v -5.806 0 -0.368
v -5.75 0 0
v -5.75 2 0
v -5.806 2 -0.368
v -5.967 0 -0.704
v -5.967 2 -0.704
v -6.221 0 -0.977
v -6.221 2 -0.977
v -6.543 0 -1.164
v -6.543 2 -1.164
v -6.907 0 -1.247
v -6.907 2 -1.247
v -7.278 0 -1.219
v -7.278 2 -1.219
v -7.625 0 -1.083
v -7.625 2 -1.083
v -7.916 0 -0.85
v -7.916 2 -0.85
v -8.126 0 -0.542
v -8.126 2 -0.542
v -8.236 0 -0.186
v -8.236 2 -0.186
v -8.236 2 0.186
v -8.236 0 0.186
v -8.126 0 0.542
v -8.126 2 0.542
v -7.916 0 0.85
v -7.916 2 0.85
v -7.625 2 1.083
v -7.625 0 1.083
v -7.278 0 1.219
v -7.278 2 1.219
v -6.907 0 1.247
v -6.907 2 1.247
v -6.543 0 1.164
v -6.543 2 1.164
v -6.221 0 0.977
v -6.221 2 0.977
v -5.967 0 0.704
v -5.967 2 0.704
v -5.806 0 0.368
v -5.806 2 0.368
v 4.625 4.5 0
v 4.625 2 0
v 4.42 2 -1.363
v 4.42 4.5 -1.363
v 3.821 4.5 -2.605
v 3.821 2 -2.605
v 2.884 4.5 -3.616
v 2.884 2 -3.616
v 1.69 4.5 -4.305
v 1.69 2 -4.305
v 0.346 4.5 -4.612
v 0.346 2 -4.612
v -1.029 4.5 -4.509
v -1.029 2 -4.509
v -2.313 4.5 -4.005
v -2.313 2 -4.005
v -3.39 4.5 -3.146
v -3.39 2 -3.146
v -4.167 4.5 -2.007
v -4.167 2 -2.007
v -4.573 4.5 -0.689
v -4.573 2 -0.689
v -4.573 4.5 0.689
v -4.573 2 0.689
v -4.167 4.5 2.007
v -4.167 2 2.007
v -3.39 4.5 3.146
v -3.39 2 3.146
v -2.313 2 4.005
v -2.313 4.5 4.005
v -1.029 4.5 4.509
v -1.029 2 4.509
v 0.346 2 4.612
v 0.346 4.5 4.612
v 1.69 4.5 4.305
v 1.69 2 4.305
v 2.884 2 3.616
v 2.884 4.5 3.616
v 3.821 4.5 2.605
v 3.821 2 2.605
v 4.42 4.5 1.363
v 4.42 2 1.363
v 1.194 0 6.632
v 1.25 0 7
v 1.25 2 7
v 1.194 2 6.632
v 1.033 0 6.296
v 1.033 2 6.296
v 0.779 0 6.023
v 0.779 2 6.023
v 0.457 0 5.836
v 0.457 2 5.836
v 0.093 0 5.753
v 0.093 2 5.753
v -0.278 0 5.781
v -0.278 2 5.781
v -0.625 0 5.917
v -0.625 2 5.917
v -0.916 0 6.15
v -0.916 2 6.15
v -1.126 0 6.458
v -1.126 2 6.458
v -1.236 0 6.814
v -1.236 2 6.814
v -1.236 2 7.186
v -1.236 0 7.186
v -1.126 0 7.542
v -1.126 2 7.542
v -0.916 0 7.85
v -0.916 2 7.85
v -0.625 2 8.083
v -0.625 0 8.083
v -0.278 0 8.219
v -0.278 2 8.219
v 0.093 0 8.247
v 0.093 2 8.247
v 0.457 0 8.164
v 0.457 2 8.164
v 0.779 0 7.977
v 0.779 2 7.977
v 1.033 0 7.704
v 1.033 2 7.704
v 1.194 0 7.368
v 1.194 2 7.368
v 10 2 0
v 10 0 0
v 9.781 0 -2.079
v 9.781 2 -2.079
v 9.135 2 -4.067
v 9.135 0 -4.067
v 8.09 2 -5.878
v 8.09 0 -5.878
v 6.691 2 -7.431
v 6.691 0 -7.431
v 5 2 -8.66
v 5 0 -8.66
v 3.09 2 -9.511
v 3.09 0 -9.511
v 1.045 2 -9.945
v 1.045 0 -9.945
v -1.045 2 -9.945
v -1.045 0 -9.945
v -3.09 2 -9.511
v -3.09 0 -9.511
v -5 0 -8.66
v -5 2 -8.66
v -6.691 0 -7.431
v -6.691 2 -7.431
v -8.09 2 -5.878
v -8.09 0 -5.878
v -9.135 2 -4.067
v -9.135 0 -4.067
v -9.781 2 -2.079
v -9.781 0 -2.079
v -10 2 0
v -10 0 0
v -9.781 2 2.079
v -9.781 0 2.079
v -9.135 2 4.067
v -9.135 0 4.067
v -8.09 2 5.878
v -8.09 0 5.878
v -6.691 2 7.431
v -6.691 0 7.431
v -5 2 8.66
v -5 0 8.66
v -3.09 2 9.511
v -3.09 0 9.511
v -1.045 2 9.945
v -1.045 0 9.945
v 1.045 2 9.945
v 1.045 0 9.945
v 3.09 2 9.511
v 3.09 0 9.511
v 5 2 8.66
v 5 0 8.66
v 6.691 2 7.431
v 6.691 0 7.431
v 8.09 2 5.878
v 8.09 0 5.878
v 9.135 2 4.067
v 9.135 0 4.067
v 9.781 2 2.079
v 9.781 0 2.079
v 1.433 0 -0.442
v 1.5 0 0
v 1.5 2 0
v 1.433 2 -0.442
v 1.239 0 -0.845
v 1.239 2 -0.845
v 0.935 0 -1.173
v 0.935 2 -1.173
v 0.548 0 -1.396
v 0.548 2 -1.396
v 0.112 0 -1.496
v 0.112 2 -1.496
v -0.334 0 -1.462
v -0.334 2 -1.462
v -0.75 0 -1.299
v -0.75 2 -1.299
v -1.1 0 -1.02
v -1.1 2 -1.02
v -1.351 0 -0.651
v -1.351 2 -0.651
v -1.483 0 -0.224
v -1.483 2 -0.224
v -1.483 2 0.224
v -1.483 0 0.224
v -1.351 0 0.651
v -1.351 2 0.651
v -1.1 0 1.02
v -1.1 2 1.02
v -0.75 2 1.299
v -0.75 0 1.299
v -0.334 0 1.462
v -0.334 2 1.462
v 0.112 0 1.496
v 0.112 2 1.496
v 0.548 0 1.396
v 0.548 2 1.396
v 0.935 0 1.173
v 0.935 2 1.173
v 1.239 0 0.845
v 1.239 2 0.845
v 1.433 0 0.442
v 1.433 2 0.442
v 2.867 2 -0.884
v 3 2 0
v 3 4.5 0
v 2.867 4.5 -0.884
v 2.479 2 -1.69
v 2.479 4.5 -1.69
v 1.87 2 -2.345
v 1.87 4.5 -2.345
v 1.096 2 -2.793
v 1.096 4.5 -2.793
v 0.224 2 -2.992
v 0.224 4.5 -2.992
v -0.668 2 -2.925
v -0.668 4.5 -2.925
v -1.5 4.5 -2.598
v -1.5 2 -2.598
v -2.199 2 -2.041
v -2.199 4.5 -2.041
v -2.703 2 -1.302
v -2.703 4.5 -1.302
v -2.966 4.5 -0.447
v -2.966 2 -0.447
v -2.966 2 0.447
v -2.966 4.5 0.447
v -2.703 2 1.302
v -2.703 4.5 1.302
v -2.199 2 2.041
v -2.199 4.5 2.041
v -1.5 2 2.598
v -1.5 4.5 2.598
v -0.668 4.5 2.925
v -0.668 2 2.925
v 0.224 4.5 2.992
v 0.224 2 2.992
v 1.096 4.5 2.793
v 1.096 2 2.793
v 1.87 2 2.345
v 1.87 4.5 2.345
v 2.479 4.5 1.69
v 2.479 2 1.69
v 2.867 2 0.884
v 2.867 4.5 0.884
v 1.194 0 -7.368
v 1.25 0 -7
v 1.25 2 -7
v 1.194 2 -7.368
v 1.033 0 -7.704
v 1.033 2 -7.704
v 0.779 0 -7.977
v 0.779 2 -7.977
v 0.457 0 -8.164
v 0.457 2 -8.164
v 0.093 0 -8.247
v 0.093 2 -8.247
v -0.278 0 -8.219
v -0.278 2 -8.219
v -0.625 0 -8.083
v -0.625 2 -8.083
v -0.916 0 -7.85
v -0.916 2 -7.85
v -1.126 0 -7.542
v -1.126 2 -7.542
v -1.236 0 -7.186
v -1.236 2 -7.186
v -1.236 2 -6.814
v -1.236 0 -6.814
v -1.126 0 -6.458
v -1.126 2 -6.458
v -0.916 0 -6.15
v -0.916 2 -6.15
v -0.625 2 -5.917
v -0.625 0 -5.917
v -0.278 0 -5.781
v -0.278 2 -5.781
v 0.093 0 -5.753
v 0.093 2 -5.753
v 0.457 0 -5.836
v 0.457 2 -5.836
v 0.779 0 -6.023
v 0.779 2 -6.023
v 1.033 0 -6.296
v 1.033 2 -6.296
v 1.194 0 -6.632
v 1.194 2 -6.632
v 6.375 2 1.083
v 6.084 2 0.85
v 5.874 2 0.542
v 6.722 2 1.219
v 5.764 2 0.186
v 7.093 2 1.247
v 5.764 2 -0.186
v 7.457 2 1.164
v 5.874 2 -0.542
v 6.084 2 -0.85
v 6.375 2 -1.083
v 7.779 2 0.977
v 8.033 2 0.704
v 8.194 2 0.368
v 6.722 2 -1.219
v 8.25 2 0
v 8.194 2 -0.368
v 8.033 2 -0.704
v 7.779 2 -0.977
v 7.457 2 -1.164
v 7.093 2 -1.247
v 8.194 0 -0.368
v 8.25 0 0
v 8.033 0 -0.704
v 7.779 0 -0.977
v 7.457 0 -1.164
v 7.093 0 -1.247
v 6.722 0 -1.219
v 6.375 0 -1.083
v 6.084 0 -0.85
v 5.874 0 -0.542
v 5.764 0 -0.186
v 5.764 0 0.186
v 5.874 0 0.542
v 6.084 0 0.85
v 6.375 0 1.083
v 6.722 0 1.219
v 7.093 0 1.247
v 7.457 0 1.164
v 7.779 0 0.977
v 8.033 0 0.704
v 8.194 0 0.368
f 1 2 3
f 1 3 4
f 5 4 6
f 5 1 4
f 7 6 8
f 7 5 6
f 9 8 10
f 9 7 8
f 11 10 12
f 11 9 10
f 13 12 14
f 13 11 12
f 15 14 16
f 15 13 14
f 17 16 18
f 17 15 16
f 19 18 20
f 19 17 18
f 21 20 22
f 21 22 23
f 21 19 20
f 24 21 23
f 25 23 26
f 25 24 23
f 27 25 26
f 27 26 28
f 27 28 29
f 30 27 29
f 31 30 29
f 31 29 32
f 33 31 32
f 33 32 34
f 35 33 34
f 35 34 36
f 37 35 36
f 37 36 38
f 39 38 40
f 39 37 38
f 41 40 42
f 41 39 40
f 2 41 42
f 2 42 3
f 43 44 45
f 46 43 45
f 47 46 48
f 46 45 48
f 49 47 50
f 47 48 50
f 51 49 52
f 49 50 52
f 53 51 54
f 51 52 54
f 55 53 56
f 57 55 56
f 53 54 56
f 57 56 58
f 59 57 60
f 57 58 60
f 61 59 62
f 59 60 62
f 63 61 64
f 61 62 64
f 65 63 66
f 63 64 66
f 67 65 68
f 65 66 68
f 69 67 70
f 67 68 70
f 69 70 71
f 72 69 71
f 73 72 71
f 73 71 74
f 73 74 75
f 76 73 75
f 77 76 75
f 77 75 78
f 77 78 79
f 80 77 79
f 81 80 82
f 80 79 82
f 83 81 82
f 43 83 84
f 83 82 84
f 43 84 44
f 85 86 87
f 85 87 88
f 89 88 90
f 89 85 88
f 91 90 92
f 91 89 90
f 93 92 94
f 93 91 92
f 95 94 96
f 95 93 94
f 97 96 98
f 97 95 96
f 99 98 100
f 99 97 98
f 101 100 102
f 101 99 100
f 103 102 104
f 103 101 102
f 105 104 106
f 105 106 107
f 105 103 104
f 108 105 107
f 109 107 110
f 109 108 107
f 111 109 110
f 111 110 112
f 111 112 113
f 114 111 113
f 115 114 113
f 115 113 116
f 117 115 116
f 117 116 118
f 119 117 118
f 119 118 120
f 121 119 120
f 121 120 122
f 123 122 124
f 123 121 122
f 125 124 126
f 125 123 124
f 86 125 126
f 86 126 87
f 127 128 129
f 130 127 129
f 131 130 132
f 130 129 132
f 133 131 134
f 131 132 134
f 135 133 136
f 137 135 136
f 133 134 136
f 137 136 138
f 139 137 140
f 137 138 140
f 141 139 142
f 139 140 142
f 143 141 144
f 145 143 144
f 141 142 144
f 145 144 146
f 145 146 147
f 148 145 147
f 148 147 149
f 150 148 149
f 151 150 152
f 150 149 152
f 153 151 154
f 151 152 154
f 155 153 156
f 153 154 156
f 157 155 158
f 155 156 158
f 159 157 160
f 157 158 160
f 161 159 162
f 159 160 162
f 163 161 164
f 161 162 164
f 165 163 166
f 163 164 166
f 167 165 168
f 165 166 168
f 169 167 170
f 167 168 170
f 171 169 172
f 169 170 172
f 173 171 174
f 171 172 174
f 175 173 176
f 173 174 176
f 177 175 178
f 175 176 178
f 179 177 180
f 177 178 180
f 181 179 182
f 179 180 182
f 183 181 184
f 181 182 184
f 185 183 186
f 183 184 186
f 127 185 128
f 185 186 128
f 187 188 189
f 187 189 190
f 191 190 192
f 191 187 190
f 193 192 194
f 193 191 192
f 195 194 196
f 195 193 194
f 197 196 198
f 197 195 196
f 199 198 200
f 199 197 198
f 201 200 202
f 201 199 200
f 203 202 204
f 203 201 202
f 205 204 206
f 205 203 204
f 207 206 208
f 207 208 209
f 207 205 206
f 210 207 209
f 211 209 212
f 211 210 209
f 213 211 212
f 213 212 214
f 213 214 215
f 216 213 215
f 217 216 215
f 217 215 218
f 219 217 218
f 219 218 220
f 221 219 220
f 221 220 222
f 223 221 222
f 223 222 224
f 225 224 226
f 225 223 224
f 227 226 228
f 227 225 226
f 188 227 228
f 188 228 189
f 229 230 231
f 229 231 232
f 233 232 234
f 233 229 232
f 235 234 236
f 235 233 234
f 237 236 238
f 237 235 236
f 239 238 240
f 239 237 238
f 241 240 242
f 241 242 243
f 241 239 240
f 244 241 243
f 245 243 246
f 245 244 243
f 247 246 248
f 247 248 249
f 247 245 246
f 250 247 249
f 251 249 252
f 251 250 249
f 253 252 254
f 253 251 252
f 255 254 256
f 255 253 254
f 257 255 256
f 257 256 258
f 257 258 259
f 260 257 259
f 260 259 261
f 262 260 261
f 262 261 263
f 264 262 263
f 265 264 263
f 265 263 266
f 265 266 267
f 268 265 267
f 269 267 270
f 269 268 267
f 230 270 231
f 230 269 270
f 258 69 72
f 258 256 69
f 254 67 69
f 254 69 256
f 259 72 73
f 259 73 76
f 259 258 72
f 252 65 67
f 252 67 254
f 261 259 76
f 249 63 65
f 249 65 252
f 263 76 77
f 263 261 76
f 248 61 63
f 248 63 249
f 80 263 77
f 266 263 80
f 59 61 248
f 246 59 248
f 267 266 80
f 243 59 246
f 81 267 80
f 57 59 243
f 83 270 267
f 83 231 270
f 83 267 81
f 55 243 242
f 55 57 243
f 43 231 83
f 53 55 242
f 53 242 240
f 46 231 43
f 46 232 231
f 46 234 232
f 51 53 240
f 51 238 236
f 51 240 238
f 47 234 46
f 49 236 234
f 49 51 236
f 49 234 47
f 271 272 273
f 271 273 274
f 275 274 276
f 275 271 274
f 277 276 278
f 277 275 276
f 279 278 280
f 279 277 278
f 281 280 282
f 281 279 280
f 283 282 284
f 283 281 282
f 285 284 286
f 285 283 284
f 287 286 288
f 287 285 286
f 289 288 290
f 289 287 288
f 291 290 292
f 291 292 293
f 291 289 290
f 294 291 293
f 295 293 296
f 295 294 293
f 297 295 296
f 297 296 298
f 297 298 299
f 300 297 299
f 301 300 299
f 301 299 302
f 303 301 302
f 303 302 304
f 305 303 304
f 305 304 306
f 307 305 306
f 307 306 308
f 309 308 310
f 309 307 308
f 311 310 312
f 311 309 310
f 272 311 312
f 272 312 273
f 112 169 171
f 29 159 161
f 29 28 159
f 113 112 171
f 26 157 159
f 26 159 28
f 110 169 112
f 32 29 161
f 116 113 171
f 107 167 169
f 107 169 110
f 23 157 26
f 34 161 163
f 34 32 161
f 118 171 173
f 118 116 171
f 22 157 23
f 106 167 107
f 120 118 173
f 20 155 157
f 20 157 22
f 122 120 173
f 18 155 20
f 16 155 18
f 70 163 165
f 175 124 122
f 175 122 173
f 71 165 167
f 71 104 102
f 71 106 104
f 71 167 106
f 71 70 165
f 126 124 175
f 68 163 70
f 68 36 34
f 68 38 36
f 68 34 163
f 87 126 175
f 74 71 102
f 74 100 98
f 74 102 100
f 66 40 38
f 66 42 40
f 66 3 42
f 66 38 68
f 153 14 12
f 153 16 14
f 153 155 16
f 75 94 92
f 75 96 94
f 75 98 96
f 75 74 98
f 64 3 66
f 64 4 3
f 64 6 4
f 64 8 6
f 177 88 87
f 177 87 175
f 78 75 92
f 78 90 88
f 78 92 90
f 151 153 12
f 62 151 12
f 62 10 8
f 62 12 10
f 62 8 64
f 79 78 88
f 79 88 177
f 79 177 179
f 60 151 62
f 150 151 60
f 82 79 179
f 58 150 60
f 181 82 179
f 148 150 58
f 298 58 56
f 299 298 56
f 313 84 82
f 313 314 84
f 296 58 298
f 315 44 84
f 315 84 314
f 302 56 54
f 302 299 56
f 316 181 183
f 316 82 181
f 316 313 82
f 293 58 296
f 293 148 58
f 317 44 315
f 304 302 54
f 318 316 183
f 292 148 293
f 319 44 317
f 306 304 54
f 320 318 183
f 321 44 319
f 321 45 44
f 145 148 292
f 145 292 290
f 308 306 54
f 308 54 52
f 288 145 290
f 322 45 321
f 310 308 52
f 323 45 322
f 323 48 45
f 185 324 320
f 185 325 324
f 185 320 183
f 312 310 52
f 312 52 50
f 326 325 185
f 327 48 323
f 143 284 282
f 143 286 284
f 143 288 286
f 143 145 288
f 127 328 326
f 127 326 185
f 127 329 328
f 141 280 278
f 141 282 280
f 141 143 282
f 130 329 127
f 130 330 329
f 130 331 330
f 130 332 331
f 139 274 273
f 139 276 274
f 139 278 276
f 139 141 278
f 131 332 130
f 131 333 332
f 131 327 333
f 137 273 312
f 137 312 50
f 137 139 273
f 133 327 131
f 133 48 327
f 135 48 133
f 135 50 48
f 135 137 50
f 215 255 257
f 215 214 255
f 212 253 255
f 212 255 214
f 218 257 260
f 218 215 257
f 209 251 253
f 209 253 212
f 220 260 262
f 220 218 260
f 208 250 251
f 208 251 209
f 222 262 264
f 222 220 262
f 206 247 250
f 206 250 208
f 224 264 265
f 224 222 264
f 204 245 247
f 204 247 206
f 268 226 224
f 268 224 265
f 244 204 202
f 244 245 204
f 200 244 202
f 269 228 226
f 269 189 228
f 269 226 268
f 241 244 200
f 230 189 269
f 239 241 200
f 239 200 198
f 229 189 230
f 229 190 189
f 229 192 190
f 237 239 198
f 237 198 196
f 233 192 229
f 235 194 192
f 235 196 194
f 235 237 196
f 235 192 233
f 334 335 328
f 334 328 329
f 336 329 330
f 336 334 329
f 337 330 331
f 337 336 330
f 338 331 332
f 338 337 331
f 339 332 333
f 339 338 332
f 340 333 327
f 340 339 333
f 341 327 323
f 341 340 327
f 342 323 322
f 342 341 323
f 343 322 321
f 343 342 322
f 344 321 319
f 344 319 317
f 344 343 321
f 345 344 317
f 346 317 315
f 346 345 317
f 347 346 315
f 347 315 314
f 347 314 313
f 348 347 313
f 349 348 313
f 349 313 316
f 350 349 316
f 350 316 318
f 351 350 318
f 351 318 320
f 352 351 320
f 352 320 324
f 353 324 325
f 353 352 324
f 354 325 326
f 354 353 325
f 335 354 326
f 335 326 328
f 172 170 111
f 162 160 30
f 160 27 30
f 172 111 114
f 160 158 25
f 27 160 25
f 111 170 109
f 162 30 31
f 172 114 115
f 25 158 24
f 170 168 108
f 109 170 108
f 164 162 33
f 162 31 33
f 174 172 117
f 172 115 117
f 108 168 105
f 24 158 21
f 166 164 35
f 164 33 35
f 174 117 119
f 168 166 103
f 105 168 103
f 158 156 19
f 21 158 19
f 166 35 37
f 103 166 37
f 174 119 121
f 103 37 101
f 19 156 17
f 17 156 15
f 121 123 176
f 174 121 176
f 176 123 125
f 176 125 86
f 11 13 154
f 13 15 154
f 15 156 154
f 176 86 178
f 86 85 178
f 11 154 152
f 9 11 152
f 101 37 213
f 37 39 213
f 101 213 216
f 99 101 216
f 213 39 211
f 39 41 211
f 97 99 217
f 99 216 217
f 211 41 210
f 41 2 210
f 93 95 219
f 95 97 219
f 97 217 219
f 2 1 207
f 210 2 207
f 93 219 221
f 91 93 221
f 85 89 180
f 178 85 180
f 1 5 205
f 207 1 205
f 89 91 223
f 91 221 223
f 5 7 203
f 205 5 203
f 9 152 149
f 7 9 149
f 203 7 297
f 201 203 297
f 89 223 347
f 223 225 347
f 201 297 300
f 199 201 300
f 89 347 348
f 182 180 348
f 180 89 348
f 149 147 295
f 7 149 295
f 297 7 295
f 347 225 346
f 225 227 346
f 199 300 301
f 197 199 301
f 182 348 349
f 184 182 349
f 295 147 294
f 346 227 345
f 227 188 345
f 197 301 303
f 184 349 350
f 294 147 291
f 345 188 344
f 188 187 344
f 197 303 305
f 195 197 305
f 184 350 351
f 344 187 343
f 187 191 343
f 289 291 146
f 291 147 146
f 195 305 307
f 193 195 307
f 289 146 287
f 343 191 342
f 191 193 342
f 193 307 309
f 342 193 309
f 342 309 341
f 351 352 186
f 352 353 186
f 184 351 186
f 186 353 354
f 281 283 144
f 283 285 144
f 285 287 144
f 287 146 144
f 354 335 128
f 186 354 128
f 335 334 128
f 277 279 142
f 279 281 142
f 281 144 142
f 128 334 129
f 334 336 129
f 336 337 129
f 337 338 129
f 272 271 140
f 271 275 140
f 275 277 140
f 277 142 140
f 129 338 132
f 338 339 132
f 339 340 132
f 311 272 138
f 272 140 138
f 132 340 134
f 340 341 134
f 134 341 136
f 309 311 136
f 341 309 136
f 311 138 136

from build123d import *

# Parameters (mm, degrees)
SKETCH1_R           = 10
SKETCH1_R_2         = 1.25
SKETCH1_R_3         = 1.5
BOSS_EXTRUDE1_DEPTH = 2
SKETCH2_R           = 4.625
SKETCH2_R_2         = 3
BOSS_EXTRUDE2_DEPTH = 2.5


with BuildPart() as part:
    # Sketch1 → Boss-Extrude1 (new body)
    with BuildSketch(Plane(origin=(0, 0, 0), x_dir=(1, 0, 0), z_dir=(0, 1, 0))):
        Circle(SKETCH1_R)
        with Locations((0, 7)):
            Circle(SKETCH1_R_2, mode=Mode.SUBTRACT)
        Circle(SKETCH1_R_3, mode=Mode.SUBTRACT)
        with Locations((7, 0)):
            Circle(SKETCH1_R_2, mode=Mode.SUBTRACT)
        with Locations((0, -7)):
            Circle(SKETCH1_R_2, mode=Mode.SUBTRACT)
        with Locations((-7, 0)):
            Circle(SKETCH1_R_2, mode=Mode.SUBTRACT)
    extrude(amount=BOSS_EXTRUDE1_DEPTH)

    # Sketch2 → Boss-Extrude2 (add)
    with BuildSketch(Plane(origin=(0, 2, 0), x_dir=(1, 0, 0), z_dir=(0, 1, 0))):
        Circle(SKETCH2_R)
        Circle(SKETCH2_R_2, mode=Mode.SUBTRACT)
    extrude(amount=BOSS_EXTRUDE2_DEPTH)


solid = part.part
